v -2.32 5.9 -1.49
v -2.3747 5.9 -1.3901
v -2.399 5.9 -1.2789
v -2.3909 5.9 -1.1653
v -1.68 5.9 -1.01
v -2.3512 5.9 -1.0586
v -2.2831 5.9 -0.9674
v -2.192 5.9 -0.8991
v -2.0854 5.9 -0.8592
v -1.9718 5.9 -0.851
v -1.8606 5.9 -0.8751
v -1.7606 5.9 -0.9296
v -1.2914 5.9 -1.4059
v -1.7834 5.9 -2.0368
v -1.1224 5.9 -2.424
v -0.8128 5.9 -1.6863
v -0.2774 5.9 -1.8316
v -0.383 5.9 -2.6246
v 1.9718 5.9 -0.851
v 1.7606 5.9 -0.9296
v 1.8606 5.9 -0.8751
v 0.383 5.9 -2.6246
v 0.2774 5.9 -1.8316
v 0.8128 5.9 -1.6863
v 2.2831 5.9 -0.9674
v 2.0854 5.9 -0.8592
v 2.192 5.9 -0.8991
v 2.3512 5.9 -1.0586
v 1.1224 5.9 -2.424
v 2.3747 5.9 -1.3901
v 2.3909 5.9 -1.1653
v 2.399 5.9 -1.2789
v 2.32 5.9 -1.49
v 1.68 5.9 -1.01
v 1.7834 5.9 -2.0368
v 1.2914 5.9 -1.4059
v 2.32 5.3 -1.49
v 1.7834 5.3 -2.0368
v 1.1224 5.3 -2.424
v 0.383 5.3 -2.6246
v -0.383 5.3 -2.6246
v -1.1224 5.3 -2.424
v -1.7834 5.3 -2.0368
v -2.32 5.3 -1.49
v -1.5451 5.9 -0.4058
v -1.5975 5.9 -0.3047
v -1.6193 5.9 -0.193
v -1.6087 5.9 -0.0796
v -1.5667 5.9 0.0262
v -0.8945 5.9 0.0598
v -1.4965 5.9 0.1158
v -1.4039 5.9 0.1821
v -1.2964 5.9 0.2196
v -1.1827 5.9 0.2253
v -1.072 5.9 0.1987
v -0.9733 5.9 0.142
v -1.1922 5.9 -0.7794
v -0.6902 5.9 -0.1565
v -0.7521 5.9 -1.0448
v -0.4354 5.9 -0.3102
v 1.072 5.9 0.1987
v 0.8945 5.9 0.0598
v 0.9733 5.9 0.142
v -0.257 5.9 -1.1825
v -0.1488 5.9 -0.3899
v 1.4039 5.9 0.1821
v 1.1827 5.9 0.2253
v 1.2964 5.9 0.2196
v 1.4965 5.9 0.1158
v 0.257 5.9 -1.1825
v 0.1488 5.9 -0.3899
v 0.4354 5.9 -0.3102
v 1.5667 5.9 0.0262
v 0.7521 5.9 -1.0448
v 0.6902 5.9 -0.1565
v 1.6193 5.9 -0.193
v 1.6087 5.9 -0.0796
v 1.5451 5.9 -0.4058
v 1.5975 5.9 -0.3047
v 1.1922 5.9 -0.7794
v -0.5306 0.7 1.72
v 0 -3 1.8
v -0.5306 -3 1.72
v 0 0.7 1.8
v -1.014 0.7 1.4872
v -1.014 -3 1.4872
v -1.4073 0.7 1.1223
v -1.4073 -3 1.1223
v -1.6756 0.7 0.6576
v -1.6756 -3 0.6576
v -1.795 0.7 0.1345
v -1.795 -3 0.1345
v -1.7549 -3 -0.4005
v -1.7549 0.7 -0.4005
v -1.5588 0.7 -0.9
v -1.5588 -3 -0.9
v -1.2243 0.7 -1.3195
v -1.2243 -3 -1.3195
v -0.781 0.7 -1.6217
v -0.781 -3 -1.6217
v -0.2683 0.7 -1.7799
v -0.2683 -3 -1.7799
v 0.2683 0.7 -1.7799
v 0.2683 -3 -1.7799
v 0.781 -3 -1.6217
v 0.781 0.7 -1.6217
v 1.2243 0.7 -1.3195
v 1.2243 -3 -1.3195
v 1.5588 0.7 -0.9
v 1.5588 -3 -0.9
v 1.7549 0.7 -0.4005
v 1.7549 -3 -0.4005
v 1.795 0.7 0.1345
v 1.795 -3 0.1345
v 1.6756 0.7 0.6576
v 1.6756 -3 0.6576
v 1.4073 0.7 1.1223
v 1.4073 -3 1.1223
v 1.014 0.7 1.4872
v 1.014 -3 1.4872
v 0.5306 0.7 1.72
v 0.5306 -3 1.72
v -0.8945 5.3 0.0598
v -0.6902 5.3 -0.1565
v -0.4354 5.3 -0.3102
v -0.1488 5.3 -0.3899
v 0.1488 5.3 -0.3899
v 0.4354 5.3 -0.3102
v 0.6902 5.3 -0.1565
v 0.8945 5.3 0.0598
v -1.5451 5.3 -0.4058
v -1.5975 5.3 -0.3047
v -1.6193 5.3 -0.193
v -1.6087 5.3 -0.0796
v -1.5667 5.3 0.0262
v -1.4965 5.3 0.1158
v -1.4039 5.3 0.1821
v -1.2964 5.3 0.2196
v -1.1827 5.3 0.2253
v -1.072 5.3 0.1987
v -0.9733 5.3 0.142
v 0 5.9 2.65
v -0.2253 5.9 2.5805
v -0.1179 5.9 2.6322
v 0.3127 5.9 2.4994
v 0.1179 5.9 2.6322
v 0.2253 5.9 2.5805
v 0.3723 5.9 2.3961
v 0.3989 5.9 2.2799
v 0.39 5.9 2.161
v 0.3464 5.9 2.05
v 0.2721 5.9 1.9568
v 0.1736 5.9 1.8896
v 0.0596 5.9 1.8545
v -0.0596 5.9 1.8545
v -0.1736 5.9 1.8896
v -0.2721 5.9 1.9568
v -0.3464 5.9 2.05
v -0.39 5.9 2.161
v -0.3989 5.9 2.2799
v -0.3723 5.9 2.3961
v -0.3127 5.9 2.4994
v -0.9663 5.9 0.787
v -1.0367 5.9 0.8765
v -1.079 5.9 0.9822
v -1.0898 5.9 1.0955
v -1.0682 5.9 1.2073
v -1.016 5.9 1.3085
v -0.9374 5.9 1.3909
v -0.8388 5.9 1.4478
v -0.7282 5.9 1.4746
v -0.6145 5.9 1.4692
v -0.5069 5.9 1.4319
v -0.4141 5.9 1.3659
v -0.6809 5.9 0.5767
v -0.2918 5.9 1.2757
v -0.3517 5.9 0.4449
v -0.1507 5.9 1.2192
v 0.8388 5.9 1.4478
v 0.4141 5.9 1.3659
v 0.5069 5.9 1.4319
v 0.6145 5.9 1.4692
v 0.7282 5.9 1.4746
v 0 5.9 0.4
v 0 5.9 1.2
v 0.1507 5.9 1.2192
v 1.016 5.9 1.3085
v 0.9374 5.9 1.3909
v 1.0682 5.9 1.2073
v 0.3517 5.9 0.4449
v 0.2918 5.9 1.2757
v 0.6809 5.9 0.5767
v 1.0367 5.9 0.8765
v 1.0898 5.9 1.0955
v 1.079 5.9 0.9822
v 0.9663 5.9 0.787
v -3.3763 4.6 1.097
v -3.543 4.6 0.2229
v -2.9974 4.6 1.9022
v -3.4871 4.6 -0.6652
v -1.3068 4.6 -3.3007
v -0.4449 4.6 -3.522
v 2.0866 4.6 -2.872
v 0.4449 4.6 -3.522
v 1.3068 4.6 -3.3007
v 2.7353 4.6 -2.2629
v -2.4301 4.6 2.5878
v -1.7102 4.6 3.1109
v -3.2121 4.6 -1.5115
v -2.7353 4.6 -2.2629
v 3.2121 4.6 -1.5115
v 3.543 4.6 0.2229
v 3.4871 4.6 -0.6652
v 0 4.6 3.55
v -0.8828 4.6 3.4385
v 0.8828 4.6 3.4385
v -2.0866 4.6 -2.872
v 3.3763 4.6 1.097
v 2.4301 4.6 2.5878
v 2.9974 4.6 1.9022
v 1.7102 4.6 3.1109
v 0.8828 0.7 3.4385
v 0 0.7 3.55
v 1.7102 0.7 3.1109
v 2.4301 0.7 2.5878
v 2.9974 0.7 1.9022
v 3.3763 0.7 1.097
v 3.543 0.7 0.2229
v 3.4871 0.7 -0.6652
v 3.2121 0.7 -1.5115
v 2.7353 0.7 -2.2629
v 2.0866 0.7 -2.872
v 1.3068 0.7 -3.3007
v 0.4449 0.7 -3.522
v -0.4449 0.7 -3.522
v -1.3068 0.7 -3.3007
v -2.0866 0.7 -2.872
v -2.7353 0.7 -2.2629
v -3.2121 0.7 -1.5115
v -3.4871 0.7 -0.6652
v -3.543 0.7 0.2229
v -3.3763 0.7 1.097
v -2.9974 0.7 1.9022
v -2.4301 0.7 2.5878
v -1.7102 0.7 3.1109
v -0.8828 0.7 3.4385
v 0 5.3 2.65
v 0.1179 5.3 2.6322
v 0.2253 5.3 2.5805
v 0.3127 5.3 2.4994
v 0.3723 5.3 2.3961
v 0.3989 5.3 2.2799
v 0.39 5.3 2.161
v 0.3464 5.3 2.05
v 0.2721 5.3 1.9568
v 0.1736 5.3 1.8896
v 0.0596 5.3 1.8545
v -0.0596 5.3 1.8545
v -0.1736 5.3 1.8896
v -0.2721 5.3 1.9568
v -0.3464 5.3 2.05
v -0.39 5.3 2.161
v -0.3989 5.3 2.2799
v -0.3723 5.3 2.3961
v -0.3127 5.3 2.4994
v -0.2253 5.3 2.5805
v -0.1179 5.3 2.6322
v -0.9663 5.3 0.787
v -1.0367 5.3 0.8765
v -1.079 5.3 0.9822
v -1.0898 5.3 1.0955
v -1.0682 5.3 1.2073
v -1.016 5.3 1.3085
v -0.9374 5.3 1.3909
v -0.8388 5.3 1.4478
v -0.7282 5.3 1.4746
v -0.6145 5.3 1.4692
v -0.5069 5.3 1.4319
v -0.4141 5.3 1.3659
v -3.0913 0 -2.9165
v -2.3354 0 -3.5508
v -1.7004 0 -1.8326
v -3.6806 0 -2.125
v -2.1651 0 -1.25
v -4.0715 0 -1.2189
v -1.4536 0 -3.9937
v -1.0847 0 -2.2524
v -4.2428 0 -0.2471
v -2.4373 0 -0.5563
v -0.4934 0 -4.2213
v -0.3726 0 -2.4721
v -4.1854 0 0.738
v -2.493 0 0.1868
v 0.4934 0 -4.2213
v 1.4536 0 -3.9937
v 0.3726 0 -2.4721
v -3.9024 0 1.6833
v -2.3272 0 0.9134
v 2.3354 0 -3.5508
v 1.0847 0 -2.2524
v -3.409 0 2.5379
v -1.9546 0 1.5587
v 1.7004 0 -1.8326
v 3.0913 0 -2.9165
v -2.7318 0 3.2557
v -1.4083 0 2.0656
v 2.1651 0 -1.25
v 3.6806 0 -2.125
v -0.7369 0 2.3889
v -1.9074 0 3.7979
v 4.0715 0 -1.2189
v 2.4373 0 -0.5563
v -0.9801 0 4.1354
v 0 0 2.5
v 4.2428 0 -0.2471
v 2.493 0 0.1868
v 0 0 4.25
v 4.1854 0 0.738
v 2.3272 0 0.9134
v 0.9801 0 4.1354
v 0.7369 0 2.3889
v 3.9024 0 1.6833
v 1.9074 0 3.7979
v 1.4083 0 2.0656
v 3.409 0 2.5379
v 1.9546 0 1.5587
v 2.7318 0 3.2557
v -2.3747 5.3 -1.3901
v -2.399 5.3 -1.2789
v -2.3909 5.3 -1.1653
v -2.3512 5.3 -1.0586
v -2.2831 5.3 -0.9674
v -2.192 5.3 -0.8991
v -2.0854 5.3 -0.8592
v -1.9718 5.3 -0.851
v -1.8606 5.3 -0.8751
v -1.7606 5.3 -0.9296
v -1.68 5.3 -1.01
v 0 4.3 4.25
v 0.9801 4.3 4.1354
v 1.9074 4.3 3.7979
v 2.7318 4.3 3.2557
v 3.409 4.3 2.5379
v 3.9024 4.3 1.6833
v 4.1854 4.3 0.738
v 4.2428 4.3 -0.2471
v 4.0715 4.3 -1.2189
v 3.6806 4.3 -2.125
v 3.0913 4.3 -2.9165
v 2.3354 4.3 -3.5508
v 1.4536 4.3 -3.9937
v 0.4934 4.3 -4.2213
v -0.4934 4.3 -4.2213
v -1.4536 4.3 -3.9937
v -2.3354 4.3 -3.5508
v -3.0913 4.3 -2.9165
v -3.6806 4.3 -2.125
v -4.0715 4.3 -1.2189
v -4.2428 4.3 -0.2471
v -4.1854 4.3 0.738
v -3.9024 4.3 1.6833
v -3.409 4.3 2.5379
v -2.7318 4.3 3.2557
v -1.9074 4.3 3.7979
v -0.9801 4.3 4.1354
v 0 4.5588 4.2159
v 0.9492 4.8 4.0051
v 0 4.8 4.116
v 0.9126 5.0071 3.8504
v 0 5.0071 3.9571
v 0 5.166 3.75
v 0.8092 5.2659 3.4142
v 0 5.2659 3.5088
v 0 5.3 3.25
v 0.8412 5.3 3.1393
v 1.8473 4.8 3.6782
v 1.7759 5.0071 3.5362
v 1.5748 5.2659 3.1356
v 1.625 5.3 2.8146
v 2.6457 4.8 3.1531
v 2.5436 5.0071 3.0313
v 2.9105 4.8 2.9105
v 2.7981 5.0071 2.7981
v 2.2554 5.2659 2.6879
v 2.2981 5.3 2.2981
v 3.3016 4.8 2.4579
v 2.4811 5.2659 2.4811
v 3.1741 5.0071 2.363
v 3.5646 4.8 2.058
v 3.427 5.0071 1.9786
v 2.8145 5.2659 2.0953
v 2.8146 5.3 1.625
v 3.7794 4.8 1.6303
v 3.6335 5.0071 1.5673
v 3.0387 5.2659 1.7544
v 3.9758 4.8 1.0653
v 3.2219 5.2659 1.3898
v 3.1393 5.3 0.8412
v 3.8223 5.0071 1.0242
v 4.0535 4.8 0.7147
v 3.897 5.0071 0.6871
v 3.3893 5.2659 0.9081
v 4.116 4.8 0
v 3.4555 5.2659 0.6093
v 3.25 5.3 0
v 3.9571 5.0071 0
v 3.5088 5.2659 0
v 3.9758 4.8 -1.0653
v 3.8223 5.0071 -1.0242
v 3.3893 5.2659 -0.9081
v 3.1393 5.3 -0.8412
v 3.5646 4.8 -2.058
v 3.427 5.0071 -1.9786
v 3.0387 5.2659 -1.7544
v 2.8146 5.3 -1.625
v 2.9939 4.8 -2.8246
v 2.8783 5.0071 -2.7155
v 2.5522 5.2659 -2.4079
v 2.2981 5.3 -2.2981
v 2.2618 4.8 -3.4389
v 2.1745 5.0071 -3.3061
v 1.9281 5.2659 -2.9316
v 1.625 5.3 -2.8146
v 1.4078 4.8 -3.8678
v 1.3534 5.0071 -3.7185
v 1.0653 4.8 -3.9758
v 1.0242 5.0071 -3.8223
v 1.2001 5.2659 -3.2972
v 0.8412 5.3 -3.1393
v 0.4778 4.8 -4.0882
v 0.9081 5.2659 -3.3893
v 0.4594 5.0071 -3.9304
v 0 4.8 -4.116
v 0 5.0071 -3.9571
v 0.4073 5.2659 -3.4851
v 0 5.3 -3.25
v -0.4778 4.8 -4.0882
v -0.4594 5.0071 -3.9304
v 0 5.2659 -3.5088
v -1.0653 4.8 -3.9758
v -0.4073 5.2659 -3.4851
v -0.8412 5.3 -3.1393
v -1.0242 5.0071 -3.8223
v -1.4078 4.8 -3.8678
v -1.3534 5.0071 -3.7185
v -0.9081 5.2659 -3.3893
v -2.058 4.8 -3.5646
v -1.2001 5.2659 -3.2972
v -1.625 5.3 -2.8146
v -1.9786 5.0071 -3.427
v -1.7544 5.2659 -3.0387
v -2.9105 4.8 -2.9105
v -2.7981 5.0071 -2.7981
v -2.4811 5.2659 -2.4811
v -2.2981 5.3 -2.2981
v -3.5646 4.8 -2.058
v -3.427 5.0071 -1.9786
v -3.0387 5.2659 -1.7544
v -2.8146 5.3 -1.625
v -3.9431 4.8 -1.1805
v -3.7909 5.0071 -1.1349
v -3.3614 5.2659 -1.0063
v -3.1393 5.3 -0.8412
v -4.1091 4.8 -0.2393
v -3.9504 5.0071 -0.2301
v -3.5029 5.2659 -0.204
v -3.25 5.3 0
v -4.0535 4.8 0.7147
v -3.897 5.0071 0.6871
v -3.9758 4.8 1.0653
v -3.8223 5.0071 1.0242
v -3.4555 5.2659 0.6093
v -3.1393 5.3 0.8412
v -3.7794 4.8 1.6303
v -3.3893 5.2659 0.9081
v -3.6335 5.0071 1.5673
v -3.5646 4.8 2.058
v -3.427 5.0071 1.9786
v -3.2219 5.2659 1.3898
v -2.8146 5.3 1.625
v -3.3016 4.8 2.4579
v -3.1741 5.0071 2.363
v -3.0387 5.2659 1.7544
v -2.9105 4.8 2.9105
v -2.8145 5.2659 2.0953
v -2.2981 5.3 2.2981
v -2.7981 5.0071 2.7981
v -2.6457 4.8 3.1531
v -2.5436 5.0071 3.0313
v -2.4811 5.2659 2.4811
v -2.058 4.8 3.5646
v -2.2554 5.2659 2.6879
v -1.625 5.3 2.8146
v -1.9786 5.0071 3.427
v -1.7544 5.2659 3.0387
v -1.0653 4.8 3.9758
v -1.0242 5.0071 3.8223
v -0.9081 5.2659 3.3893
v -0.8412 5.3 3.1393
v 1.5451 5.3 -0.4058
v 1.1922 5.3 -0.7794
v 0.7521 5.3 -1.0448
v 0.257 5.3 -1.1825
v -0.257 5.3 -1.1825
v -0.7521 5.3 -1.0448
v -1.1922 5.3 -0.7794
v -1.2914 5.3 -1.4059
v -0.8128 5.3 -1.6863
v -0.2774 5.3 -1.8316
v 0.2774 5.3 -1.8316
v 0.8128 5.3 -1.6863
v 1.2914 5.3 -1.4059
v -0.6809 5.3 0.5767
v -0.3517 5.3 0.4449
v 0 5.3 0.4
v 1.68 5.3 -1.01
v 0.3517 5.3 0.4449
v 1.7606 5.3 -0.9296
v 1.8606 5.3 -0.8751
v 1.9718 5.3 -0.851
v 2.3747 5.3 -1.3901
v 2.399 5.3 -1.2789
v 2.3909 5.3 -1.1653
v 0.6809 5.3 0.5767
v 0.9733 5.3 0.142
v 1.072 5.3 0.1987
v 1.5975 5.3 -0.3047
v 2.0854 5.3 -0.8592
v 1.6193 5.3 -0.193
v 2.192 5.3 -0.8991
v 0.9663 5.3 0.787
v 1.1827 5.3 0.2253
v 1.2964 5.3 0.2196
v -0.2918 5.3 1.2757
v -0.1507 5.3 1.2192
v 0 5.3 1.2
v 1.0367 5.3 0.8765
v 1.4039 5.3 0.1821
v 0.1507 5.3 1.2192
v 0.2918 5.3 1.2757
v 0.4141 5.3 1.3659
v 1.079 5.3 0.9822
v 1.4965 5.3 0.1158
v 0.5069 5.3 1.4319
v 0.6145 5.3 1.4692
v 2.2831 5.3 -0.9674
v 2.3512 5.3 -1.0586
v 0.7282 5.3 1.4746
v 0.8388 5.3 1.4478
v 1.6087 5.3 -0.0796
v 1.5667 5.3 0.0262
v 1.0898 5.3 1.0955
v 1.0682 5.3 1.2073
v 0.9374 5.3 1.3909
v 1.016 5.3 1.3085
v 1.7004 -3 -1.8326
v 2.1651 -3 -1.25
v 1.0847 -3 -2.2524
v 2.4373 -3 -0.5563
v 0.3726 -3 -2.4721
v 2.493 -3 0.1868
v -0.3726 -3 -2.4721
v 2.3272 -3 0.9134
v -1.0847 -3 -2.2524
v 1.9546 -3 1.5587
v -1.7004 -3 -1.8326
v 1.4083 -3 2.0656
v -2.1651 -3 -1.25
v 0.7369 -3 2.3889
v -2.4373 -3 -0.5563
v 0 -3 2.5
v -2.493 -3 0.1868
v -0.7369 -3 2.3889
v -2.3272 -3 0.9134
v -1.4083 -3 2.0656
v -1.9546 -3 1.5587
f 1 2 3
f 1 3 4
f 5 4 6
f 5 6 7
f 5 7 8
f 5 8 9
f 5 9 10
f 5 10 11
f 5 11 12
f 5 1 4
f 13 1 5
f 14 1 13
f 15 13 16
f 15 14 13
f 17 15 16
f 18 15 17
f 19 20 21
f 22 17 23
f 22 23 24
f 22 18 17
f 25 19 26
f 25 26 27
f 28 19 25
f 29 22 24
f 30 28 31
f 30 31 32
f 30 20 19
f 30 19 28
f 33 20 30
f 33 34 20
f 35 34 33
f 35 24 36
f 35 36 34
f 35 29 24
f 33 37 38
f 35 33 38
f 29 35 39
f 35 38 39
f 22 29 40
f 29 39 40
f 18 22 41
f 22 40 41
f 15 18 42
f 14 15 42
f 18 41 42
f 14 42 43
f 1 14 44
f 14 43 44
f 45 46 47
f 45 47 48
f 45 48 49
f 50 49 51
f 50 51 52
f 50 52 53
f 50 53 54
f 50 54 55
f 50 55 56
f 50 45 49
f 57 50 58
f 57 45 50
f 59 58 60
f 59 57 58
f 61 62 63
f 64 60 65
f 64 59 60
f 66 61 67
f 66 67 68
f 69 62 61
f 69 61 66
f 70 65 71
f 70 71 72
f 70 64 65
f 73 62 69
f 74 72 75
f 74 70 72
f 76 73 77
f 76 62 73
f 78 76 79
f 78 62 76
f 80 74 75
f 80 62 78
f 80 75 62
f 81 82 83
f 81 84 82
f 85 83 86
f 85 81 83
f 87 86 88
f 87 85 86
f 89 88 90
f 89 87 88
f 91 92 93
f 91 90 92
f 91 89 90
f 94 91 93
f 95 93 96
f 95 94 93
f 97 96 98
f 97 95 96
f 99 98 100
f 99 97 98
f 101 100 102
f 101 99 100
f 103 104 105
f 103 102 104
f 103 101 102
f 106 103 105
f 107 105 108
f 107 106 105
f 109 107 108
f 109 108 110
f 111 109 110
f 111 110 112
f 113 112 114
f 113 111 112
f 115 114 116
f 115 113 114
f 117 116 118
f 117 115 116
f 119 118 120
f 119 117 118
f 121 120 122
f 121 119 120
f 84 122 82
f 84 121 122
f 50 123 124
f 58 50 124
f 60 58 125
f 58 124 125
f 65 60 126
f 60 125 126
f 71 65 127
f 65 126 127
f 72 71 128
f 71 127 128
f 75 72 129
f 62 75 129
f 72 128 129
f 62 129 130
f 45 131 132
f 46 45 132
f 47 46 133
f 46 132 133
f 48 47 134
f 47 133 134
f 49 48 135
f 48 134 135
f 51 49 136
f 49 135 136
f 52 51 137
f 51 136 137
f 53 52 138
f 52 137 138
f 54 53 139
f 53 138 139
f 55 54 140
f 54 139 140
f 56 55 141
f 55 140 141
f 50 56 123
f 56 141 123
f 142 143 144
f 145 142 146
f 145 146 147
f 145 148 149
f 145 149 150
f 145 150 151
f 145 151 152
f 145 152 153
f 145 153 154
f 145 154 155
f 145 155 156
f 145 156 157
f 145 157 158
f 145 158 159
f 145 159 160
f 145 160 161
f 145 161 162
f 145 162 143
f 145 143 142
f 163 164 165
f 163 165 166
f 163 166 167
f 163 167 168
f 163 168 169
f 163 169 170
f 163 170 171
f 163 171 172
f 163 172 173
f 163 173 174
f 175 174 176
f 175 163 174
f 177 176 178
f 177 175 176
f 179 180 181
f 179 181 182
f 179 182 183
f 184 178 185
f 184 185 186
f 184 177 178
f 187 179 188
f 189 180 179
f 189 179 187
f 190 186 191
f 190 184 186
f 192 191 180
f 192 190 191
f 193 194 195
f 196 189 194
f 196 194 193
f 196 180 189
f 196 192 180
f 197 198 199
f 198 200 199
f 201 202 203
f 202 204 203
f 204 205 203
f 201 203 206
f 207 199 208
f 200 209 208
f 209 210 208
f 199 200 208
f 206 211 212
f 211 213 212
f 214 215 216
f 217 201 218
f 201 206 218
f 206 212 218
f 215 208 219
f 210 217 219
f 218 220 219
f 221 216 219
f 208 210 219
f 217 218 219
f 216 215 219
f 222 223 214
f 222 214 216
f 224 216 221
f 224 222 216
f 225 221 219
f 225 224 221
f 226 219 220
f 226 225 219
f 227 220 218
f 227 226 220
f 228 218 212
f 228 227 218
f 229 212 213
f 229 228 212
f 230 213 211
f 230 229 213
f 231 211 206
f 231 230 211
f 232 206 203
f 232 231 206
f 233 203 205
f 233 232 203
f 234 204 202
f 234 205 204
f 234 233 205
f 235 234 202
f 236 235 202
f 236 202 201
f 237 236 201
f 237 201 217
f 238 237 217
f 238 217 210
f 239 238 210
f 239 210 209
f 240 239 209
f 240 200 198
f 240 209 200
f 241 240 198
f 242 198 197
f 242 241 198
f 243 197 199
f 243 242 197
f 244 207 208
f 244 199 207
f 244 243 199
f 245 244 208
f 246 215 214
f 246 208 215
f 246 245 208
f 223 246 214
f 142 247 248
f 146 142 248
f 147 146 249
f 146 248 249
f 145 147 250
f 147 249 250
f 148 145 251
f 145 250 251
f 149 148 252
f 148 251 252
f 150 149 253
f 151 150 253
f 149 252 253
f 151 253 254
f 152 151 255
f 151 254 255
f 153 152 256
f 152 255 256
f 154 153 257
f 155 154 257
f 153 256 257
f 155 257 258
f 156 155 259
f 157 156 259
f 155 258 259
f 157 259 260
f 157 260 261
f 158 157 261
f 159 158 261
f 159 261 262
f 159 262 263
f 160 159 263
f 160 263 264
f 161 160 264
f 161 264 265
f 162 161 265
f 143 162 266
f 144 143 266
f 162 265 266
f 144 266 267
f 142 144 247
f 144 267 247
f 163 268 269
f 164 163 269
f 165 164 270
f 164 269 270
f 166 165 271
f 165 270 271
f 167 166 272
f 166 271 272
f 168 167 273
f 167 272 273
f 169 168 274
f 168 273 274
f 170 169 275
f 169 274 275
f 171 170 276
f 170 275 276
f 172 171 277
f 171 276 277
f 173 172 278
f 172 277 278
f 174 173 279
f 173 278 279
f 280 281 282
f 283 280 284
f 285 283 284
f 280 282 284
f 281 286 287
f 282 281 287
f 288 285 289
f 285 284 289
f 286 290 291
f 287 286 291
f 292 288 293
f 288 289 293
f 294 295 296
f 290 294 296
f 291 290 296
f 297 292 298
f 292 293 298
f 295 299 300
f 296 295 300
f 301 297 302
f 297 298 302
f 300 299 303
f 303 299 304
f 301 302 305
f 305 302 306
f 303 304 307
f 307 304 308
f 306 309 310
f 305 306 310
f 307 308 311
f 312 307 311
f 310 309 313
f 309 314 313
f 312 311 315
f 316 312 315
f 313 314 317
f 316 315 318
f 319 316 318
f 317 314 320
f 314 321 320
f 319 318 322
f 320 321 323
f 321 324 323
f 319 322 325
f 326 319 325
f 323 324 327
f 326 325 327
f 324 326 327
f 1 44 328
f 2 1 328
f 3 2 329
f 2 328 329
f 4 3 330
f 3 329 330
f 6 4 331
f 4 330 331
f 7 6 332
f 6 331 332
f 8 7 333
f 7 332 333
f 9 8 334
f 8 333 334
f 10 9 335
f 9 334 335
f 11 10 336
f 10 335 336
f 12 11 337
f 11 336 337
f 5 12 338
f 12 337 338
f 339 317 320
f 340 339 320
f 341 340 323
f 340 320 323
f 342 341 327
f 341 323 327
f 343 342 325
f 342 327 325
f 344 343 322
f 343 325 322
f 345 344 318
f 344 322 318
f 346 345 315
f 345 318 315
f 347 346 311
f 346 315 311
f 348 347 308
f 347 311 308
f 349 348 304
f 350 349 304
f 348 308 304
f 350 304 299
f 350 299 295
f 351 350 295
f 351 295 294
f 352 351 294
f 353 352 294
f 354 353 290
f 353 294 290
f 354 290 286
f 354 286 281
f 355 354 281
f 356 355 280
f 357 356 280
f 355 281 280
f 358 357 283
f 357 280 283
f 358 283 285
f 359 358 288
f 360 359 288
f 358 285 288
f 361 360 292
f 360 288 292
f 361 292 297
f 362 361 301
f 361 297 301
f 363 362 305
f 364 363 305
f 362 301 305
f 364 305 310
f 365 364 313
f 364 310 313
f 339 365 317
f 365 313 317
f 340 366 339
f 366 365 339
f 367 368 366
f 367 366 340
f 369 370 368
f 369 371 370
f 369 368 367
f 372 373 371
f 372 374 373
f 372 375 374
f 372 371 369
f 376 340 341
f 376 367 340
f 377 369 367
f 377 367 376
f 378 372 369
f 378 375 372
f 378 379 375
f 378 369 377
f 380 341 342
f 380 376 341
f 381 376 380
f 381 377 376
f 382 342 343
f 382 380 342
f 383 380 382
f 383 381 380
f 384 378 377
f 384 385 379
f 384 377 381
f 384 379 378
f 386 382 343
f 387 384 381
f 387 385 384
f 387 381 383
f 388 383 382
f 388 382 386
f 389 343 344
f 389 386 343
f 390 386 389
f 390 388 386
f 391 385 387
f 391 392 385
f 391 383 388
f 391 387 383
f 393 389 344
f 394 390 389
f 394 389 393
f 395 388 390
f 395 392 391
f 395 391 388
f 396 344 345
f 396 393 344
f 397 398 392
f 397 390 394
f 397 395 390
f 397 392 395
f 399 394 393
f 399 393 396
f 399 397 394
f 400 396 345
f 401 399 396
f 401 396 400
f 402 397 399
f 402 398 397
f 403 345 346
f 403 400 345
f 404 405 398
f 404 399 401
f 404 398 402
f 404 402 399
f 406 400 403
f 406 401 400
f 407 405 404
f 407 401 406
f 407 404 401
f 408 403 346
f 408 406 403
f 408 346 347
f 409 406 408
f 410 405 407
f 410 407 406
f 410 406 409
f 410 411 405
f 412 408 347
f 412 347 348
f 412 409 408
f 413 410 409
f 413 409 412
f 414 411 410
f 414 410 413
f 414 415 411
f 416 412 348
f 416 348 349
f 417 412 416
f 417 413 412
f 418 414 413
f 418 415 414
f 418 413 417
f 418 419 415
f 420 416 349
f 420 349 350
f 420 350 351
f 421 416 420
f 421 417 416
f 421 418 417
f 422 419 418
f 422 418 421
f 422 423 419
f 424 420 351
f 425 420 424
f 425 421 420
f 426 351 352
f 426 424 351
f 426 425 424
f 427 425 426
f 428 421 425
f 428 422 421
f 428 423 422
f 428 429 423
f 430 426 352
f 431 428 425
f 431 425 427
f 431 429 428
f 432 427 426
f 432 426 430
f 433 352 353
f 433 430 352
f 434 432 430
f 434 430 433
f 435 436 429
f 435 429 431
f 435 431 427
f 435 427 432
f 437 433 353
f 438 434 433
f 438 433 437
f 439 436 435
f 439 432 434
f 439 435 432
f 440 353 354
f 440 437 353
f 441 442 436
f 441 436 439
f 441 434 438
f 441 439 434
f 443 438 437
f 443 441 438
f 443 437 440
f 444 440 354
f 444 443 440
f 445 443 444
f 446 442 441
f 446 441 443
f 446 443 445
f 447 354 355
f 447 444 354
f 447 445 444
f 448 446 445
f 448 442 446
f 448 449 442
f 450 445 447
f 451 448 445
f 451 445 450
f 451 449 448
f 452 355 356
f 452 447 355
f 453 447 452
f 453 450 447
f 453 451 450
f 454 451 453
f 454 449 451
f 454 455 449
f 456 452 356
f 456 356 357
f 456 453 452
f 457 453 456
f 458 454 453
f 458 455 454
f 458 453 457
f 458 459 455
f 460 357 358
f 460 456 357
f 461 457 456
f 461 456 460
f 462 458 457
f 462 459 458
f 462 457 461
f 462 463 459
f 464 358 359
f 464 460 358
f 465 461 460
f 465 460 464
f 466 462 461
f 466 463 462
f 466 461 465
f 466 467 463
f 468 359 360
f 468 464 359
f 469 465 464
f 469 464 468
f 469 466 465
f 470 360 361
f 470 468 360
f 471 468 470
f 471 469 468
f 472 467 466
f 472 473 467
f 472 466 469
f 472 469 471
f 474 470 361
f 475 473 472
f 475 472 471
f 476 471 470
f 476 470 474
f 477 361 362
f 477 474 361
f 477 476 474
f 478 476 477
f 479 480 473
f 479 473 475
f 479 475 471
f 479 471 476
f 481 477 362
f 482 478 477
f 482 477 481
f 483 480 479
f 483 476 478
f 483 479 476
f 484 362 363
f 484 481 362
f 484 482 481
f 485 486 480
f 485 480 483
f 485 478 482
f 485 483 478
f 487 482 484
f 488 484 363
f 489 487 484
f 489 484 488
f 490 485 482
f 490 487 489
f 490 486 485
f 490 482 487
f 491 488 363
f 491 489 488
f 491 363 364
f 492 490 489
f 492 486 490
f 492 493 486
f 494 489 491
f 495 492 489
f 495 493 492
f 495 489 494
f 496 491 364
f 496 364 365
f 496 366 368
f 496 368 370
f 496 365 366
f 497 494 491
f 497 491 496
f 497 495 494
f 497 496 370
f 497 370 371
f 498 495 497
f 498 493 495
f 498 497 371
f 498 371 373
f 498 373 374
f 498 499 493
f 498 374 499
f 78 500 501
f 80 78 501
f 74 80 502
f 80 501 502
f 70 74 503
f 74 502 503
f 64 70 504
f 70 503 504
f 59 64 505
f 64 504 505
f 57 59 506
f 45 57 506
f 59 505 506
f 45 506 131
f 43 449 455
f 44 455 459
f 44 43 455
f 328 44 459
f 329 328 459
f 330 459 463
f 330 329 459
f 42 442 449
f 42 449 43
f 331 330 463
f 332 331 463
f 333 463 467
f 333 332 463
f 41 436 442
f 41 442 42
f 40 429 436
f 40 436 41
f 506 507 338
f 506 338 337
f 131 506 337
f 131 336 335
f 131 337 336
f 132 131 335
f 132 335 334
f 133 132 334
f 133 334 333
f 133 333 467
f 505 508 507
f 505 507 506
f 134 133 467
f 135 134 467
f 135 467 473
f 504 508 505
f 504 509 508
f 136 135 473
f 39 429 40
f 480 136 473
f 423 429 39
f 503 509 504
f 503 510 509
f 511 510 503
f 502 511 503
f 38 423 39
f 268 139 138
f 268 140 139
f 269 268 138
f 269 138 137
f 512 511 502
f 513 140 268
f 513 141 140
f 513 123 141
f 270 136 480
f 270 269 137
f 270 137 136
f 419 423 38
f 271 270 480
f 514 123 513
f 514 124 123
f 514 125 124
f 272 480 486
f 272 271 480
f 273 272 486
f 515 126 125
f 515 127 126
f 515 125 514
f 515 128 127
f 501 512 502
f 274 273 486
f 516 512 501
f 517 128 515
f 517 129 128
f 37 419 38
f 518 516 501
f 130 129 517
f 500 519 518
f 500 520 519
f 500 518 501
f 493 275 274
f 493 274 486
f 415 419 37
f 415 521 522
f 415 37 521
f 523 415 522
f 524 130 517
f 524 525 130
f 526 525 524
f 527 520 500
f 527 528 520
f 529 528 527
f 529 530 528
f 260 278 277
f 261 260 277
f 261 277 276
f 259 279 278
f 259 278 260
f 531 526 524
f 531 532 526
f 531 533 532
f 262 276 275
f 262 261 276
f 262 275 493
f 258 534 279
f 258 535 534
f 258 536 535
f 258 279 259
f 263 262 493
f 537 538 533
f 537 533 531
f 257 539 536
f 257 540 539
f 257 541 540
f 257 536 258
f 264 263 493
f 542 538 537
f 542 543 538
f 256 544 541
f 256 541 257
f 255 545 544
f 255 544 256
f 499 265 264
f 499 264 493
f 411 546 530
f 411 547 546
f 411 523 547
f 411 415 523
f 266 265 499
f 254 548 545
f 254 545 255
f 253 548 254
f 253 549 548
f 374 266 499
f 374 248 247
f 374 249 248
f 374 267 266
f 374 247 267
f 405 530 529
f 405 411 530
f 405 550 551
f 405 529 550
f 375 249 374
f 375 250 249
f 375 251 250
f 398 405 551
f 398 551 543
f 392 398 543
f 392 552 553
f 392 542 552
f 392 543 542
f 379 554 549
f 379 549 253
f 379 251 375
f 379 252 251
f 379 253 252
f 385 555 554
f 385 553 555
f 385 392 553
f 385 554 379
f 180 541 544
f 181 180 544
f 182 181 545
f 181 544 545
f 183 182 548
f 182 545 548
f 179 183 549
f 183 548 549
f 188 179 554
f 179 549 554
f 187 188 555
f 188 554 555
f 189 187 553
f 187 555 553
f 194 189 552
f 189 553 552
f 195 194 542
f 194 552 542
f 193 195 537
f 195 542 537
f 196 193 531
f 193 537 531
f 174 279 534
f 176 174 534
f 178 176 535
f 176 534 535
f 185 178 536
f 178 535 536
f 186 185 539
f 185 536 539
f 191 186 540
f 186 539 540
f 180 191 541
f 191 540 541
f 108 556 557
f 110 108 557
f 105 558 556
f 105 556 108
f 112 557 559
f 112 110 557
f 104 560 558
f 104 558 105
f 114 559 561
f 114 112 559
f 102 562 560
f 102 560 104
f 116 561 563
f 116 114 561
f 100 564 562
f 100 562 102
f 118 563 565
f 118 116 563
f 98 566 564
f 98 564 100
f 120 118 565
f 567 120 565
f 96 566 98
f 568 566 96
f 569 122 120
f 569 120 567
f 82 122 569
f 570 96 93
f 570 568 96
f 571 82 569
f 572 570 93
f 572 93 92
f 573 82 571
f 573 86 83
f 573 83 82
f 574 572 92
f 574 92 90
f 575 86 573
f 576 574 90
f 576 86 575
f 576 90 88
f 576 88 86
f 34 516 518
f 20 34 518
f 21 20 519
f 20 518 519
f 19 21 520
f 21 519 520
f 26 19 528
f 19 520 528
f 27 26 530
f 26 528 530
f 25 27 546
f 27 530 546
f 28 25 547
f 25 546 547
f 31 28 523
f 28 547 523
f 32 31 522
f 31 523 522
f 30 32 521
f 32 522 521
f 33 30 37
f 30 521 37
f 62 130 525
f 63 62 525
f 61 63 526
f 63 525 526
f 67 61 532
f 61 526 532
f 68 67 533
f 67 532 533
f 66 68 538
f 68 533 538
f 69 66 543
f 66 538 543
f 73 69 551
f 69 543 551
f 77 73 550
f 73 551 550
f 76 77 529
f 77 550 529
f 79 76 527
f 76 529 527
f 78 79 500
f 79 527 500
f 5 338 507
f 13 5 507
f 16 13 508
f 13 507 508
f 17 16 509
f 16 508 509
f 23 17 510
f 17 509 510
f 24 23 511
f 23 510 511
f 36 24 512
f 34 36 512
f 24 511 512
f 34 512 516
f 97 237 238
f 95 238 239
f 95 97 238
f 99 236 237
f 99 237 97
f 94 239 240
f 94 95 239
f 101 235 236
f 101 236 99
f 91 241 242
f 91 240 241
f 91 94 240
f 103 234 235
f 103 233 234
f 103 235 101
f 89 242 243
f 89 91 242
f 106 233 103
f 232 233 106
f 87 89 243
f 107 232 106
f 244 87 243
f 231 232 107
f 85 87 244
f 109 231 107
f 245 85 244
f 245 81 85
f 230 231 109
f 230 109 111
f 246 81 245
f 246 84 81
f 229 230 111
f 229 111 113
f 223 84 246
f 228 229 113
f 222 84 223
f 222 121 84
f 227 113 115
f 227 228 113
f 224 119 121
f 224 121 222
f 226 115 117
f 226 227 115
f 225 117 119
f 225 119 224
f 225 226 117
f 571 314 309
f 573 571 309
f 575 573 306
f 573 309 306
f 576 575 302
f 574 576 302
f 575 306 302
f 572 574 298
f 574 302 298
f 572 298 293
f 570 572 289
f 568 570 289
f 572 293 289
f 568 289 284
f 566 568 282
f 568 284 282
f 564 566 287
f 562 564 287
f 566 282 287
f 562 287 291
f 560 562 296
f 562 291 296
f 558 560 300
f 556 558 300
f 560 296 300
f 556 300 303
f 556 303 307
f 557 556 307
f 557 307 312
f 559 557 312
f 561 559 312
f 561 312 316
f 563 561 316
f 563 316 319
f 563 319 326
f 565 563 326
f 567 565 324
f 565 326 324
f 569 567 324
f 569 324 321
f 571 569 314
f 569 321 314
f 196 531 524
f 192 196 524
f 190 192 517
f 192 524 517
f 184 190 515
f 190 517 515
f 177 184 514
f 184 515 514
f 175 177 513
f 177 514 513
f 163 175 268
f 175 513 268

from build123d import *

# Parameters (mm, degrees)
SKETCH1_R           = 4.25
BOSS_EXTRUDE1_DEPTH = 5.3
SKETCH2_R           = 2.5
BOSS_EXTRUDE2_DEPTH = 3
SHELL2_T            = -0.7
FILLET1_R           = 1
SKETCH3_R           = 0.4
BOSS_EXTRUDE4_DEPTH = 0.6


with BuildPart() as part:
    # Sketch1 → Boss-Extrude1 (new body)
    with BuildSketch(Plane(origin=(0, 0, 0), x_dir=(1, 0, 0), z_dir=(0, 1, 0))):
        with Locations(Location((0, 0, 0), (0, 0, 270))):
            Circle(SKETCH1_R)
    extrude(amount=BOSS_EXTRUDE1_DEPTH)

    # Sketch2 → Boss-Extrude2 (add)
    with BuildSketch(Plane.XZ):
        with Locations(Location((0, 0, 0), (0, 0, 90))):
            Circle(SKETCH2_R)
    extrude(amount=BOSS_EXTRUDE2_DEPTH)

    # Shell2
    shell2_openings = [part.faces().sort_by_distance(p)[0] for p in [
        (0, -3, 0),
    ]]
    offset(amount=SHELL2_T, openings=shell2_openings, kind=Kind.INTERSECTION)

    # Fillet1
    fillet1_edges = [part.edges().sort_by_distance(p)[0] for p in [
        (0, 5.3, -4.25),
    ]]
    fillet(fillet1_edges, radius=FILLET1_R)

    # Sketch3 → Boss-Extrude4 (add)
    with BuildSketch(Plane(origin=(0, 5.3, 0), x_dir=(1, 0, 0), z_dir=(0, 1, 0))):
        with Locations(Location((0, -2.25, 0), (0, 0, 270))):
            Circle(SKETCH3_R)
        with BuildLine():
            ThreePointArc((0.966334519, -0.786985884), (0, -0.4), (-0.966334519, -0.786985884))
            ThreePointArc((-0.966334519, -0.786985884), (-0.979671546, -1.352514066), (-0.414143365, -1.365851093))
            ThreePointArc((-0.414143365, -1.365851093), (0, -1.2), (0.414143365, -1.365851093))
            ThreePointArc((0.414143365, -1.365851093), (0.979671546, -1.352514066), (0.966334519, -0.786985884))
        make_face()
        with BuildLine():
            ThreePointArc((1.545056478, 0.405803093), (0, 1.2), (-1.545056478, 0.405803093))
            ThreePointArc((-1.545056478, 0.405803093), (-1.452582081, -0.152272606), (-0.894506382, -0.059798209))
            ThreePointArc((-0.894506382, -0.059798209), (0, 0.4), (0.894506382, -0.059798209))
            ThreePointArc((0.894506382, -0.059798209), (1.452582081, -0.152272606), (1.545056478, 0.405803093))
        make_face()
        with BuildLine():
            ThreePointArc((2.32, 1.49), (0, 2.65), (-2.32, 1.49))
            ThreePointArc((-2.32, 1.49), (-2.24, 0.93), (-1.68, 1.01))
            ThreePointArc((-1.68, 1.01), (0, 1.85), (1.68, 1.01))
            ThreePointArc((1.68, 1.01), (2.24, 0.93), (2.32, 1.49))
        make_face()
    extrude(amount=BOSS_EXTRUDE4_DEPTH)


solid = part.part
